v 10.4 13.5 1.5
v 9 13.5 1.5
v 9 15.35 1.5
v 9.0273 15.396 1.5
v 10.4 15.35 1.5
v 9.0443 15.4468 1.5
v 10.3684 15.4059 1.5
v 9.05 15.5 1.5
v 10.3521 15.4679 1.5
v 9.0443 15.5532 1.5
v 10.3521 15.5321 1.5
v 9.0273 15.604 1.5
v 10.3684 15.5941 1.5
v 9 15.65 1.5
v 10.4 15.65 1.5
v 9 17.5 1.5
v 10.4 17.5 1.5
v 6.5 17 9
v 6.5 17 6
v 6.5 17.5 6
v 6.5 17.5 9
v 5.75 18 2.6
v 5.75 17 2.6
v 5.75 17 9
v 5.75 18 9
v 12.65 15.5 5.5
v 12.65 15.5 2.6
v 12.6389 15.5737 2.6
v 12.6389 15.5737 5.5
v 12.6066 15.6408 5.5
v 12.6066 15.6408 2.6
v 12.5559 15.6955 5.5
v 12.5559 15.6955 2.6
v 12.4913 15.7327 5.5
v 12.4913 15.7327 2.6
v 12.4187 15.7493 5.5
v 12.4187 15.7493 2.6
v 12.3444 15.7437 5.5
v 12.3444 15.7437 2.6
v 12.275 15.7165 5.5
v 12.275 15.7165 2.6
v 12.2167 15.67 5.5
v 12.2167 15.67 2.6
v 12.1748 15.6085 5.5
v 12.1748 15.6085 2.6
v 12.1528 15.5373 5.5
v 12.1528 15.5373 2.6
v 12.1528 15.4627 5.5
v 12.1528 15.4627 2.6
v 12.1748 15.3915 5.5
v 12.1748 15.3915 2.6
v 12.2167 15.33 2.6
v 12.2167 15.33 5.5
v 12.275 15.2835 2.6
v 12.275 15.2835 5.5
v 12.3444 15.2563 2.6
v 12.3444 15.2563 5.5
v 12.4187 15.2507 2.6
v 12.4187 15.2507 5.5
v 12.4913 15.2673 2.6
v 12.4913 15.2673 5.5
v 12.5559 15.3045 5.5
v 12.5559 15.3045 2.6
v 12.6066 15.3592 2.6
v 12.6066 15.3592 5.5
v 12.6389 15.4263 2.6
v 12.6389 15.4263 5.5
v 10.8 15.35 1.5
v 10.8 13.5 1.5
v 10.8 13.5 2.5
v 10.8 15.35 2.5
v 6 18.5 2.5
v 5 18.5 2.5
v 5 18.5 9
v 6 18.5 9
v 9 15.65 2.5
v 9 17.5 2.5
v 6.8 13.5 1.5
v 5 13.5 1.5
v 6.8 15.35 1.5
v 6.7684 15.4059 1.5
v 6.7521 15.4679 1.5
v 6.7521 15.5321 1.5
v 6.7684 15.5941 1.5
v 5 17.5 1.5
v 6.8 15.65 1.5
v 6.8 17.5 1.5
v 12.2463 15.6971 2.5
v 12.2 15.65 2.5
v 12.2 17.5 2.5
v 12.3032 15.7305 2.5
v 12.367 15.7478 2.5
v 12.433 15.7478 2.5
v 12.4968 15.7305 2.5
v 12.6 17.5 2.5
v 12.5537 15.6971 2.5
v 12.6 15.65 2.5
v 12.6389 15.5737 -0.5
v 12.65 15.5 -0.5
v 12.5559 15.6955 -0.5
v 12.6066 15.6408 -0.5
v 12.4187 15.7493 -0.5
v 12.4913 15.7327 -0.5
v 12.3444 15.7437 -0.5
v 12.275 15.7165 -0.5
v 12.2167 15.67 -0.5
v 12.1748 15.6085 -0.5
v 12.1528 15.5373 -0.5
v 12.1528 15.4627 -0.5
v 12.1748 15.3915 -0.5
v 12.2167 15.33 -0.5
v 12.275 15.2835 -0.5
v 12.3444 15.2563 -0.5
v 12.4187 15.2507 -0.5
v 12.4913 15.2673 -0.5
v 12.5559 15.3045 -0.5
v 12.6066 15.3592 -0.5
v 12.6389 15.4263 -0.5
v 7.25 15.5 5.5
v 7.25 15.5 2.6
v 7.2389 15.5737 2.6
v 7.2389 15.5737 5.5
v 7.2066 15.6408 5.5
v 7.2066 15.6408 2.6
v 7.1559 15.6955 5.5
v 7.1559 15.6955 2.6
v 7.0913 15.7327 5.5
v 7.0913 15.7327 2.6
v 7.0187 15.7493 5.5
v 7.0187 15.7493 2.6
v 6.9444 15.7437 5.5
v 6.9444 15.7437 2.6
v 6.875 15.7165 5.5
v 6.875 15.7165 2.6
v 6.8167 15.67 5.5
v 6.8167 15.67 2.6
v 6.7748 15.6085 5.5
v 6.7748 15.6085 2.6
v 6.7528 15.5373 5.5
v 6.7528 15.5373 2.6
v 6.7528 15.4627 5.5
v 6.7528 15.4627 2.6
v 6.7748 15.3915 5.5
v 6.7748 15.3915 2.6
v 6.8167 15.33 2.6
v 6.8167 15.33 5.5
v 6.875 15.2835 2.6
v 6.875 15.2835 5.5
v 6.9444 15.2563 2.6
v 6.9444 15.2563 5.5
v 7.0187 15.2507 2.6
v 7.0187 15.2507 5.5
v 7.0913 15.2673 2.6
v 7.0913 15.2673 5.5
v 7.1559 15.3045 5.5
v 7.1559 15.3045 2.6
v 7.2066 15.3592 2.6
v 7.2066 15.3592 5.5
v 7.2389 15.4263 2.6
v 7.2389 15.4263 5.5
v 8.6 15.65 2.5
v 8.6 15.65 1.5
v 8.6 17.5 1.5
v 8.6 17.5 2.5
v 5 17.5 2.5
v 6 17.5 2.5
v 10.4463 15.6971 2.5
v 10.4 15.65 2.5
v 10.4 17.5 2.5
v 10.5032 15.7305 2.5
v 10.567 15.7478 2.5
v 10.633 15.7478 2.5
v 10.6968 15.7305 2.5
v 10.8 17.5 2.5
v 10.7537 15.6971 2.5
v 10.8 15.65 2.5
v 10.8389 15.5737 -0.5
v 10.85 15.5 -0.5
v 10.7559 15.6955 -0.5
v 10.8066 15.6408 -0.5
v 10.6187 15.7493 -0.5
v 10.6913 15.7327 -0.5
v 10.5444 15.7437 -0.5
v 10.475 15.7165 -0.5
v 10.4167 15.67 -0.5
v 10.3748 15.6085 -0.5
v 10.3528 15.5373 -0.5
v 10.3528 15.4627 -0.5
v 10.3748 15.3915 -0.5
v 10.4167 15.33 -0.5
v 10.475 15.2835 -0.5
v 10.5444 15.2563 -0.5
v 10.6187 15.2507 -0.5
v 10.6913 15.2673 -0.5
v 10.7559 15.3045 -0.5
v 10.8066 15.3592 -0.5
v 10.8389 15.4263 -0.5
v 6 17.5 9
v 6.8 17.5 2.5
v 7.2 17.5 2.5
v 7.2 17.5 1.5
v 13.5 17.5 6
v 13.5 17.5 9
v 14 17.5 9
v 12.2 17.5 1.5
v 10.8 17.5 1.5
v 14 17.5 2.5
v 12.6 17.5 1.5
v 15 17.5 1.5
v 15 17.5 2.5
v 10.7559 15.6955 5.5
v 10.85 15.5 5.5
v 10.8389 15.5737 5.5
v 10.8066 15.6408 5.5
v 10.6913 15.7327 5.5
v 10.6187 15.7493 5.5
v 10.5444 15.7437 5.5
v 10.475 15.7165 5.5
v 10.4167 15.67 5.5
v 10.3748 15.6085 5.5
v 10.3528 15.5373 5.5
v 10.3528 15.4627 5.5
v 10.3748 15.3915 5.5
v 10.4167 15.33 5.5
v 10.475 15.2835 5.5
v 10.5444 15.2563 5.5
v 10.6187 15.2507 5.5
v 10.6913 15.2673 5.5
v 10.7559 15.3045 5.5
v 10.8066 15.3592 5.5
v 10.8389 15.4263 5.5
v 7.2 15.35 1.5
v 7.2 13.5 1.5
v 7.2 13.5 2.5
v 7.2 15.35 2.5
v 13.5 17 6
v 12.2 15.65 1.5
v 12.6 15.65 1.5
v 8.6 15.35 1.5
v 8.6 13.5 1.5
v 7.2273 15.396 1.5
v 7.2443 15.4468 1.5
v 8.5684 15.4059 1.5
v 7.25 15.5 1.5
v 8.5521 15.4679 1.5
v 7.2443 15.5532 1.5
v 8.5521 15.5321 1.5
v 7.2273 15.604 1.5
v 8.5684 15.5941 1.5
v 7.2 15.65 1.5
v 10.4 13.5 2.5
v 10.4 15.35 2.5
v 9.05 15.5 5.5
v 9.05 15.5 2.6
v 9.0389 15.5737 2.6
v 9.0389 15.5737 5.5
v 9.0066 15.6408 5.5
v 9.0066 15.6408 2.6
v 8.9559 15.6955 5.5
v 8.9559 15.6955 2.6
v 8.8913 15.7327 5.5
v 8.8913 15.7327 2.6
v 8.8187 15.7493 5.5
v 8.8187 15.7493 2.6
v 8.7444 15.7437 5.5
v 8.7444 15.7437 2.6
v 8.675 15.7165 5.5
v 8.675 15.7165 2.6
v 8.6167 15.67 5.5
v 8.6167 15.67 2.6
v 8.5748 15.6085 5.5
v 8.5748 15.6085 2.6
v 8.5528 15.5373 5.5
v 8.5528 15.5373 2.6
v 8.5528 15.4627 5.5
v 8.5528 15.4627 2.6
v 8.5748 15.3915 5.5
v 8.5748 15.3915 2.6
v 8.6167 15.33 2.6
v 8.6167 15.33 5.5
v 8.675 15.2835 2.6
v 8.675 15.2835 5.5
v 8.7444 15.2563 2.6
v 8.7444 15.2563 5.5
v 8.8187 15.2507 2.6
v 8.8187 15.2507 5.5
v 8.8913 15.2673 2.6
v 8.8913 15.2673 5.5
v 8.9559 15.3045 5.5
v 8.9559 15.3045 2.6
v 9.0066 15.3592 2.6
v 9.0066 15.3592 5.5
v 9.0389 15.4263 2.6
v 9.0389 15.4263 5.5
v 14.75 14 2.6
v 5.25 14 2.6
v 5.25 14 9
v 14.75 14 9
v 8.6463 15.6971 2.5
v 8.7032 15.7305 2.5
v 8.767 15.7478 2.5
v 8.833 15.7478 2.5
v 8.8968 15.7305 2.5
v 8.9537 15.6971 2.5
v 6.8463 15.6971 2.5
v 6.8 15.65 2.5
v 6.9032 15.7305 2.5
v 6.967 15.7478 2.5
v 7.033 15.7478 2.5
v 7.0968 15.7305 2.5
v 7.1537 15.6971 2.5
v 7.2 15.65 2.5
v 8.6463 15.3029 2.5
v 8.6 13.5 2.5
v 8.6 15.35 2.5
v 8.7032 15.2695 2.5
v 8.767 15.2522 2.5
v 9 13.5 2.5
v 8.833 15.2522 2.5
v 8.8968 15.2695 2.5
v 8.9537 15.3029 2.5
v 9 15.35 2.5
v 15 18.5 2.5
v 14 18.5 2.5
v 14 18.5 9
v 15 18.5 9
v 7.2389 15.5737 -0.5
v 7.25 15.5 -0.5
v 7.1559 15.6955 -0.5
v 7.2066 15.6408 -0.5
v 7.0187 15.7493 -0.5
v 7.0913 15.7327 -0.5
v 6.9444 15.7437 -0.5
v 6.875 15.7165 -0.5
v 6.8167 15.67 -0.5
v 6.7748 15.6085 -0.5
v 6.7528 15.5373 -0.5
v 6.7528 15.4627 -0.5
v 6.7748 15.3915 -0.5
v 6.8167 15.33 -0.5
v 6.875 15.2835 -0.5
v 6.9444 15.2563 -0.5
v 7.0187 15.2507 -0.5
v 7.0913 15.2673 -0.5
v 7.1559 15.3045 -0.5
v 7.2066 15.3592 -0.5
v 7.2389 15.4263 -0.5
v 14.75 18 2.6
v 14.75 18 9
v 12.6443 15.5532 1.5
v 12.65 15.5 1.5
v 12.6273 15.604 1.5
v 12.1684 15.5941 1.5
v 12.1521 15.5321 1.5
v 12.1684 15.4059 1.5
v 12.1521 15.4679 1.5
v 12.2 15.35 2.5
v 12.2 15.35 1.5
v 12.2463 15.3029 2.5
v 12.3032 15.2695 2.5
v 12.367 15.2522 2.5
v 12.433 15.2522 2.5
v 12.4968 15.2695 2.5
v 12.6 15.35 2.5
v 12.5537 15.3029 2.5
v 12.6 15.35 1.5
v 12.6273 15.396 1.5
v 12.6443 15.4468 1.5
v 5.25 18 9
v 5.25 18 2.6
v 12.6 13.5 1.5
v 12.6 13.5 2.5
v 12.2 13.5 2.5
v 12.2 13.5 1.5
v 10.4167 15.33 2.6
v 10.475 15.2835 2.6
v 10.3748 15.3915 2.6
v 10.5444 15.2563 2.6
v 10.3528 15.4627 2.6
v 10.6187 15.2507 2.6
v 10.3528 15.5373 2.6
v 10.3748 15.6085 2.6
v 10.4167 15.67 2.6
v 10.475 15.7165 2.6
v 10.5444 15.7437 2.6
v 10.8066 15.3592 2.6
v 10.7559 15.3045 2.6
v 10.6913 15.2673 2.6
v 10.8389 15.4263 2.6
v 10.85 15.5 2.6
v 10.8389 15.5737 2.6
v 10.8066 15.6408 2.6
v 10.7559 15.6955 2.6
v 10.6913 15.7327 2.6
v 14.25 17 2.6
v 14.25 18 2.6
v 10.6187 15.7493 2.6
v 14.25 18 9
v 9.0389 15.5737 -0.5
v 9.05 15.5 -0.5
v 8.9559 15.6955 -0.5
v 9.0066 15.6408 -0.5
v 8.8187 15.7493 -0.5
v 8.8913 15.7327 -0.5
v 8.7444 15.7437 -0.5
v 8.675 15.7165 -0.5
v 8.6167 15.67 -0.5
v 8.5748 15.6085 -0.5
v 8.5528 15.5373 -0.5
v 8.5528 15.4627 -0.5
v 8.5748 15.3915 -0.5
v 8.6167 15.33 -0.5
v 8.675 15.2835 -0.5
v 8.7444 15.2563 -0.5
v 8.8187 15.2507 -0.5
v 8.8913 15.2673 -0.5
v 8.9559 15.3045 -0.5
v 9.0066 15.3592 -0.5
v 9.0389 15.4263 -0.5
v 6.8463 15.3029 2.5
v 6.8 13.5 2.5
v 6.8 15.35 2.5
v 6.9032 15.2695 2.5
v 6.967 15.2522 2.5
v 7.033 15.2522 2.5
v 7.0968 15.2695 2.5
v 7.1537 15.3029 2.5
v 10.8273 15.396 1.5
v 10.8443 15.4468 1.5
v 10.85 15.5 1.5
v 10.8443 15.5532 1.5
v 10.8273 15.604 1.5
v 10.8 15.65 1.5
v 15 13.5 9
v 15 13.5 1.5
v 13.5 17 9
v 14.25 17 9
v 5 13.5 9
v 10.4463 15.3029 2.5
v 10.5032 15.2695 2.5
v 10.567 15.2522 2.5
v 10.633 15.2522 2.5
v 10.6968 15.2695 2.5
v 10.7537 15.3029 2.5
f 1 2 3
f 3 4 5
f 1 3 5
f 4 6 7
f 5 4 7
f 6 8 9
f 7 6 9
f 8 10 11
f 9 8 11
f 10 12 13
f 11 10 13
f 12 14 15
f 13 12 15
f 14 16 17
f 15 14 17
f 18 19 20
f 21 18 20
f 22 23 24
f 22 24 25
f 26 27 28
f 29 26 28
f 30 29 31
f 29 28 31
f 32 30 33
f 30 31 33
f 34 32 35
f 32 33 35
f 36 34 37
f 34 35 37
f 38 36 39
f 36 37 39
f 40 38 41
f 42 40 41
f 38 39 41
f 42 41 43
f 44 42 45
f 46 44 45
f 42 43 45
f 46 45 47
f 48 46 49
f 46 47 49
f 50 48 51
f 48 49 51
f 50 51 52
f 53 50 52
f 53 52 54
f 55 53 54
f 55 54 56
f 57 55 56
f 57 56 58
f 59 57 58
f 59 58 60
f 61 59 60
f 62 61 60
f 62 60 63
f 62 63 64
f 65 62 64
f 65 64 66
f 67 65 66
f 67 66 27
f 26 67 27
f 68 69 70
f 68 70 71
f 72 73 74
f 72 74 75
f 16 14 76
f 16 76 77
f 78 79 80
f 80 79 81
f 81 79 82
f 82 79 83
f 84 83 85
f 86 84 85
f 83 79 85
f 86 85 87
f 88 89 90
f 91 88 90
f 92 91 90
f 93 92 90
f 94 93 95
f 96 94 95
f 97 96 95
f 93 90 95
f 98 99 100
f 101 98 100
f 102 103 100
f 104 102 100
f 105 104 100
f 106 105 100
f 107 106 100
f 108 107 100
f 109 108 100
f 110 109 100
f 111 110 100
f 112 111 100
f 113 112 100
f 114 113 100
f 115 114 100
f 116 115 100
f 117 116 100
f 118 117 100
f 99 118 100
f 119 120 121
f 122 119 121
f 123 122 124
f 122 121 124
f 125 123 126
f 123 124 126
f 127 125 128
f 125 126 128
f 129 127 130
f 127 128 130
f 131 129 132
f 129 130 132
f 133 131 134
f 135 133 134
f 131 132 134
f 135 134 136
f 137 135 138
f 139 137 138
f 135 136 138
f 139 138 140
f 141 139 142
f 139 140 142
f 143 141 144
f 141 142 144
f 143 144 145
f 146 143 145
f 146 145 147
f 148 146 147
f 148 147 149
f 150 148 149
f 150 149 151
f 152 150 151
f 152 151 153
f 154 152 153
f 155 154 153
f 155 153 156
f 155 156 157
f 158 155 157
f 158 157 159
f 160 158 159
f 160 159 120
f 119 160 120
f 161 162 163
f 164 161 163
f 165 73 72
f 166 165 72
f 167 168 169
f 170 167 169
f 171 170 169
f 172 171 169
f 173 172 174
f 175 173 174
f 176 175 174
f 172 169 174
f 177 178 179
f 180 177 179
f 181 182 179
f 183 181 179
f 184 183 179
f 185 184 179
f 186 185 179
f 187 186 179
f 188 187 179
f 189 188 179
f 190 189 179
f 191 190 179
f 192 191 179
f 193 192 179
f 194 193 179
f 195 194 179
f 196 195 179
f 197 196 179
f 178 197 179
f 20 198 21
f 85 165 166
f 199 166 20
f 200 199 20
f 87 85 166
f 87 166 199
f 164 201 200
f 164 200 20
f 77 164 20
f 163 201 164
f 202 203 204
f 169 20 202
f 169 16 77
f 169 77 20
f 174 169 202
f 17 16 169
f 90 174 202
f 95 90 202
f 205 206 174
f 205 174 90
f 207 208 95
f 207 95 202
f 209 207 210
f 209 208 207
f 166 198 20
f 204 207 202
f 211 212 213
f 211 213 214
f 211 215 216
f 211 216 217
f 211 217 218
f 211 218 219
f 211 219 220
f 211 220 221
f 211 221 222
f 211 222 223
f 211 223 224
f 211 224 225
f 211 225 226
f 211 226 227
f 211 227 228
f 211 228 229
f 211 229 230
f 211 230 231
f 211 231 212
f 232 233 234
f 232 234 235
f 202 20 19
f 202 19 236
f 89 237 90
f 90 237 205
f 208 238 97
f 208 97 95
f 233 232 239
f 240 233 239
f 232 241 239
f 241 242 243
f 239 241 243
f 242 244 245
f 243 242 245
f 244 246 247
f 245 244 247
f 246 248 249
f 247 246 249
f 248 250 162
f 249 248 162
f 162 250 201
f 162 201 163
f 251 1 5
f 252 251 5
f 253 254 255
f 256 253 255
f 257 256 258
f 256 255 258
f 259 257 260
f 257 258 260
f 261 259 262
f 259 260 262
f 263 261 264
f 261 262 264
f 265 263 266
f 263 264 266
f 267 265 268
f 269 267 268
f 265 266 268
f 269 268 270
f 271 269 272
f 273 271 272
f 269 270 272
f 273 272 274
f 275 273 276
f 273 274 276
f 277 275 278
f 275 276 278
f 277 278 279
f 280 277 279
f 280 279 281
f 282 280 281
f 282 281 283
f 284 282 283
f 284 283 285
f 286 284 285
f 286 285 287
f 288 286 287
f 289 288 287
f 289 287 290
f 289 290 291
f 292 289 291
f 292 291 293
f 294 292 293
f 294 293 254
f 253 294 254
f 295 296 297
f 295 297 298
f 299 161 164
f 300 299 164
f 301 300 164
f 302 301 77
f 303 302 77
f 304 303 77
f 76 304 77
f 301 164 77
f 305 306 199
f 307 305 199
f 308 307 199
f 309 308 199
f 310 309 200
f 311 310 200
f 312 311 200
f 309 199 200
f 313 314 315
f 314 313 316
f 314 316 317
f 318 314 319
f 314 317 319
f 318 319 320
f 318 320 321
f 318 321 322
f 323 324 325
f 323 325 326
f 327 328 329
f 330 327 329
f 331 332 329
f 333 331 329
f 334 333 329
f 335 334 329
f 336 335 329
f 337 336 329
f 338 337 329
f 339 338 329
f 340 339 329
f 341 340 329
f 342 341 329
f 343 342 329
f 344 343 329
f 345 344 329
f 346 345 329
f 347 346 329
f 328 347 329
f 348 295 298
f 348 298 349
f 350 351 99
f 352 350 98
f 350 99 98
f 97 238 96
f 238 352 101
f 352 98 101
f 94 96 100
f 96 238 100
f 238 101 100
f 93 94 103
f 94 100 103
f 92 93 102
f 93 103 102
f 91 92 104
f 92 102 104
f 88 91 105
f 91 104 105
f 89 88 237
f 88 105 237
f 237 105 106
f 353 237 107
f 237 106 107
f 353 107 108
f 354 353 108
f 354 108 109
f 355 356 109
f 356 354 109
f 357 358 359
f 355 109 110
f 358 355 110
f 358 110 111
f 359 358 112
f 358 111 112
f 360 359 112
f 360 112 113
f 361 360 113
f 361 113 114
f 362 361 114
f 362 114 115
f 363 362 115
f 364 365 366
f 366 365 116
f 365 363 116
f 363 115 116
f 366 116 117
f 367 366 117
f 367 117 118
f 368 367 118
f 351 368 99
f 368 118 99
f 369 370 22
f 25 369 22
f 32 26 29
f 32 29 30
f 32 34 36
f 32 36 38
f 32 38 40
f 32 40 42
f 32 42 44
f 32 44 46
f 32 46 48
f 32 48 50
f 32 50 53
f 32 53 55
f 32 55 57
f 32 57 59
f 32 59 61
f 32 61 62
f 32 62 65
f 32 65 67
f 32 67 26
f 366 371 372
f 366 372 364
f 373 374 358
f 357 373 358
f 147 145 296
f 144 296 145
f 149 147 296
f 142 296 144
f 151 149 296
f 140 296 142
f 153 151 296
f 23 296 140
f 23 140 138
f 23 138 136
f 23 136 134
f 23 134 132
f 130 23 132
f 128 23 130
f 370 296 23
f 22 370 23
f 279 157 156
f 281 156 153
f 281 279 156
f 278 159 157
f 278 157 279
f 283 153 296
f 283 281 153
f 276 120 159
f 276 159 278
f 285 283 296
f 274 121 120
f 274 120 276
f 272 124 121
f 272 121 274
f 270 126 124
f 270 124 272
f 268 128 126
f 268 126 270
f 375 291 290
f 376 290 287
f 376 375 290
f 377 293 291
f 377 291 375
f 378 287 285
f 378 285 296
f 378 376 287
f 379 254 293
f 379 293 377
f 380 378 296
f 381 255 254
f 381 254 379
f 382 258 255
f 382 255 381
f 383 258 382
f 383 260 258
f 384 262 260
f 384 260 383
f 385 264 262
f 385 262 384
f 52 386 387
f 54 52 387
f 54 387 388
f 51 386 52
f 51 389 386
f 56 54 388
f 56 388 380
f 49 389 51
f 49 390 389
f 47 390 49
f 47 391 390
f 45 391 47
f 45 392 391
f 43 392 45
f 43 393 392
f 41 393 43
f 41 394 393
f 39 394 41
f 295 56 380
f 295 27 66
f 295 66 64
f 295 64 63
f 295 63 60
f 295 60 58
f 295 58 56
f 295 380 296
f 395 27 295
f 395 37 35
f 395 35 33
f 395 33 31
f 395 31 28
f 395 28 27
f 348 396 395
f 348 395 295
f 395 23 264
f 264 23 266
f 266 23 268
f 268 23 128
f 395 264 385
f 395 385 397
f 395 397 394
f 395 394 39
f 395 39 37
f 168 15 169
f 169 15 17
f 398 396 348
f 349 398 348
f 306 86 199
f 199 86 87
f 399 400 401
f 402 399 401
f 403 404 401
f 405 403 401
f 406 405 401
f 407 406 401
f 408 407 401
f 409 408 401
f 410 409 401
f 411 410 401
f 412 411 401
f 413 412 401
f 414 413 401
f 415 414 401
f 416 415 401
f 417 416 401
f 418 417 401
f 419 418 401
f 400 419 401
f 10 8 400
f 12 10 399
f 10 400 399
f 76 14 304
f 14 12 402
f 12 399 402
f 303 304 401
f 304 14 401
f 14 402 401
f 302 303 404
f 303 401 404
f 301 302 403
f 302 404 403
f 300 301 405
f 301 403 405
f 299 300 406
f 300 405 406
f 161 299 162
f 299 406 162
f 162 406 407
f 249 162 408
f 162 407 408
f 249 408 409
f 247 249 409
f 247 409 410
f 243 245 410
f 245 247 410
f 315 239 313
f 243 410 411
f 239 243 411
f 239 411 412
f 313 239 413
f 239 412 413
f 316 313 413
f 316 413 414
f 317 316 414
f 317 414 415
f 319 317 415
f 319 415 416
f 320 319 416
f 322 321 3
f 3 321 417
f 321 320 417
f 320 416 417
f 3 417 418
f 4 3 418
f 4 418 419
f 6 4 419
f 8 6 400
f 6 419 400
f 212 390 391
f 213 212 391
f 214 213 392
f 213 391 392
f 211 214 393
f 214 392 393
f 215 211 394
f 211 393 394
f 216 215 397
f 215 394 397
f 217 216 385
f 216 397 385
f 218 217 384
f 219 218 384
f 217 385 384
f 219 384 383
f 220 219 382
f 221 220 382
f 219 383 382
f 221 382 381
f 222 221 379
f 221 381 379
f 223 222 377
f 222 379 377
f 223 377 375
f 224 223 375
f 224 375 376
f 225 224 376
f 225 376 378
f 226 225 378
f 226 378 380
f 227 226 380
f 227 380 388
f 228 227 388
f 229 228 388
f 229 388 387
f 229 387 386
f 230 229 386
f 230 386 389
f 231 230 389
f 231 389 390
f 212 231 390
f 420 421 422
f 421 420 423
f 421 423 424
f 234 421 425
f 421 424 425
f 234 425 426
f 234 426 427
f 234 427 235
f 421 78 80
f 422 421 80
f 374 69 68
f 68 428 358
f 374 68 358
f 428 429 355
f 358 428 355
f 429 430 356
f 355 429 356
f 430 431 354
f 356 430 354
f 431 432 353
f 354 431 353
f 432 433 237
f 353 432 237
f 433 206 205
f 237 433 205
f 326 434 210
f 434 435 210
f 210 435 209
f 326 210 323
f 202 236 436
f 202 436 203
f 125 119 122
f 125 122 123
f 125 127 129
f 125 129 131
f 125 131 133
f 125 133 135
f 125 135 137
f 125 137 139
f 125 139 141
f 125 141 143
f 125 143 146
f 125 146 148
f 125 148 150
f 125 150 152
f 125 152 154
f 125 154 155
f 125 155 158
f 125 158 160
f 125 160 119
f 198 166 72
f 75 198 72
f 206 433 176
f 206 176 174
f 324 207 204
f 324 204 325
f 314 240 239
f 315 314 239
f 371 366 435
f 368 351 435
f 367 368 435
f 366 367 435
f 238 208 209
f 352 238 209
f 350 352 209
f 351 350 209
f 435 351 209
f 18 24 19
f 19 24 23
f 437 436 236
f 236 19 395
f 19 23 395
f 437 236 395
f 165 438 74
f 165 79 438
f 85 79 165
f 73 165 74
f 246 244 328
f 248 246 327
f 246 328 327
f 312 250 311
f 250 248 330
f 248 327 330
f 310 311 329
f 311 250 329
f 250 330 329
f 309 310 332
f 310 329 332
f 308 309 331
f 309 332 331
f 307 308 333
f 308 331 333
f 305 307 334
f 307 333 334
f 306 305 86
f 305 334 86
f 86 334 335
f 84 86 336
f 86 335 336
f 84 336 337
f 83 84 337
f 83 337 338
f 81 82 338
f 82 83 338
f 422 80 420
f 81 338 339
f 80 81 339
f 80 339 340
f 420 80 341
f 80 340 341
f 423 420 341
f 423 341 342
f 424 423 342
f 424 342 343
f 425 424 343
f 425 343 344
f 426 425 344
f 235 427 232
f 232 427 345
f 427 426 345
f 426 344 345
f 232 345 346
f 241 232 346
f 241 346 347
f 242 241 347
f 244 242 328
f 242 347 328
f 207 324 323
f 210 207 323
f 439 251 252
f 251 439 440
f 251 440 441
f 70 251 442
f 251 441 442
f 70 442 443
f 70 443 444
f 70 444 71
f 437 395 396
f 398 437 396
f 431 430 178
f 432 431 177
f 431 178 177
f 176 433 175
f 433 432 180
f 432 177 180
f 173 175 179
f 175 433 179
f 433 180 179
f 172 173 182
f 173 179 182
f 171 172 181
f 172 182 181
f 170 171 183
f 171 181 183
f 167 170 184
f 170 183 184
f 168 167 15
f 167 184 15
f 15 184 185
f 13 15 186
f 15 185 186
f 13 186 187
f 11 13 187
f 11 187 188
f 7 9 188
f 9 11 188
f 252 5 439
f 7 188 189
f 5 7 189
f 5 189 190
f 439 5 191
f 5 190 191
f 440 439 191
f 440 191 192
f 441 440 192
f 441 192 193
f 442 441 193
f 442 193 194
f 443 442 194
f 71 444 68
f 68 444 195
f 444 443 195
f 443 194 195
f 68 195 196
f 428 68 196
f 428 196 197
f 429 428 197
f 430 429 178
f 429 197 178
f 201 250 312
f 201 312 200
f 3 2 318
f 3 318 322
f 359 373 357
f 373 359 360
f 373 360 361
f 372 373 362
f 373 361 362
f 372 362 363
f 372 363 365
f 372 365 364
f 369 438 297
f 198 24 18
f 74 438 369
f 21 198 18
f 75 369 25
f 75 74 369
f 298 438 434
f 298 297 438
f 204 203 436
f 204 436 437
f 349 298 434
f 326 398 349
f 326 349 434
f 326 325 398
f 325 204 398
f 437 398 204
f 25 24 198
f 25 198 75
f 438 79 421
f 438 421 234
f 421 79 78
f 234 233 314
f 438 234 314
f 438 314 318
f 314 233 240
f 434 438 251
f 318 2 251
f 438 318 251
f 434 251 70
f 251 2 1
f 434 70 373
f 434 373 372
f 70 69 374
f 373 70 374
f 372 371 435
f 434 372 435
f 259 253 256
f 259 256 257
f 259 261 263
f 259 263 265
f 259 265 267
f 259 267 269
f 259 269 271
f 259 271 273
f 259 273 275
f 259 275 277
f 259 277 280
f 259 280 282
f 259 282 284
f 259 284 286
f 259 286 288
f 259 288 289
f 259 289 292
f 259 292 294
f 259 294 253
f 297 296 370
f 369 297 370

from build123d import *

# Parameters (mm, degrees)
CYLINDER_R     = 0.25
CYLINDER_DEPTH = 6
ARRAY_X_COUNT  = 4
ARRAY_X_PITCH  = 1.8
BOX011_W       = 7
BOX011_H       = 7
BOX011_DEPTH   = 3
BOX010_W       = 0.5
BOX010_H       = 4
BOX010_DEPTH   = 10
BOX009_W       = 0.5
BOX009_H       = 4
BOX009_DEPTH   = 10
BOX008_W       = 8
BOX008_H       = 3
BOX008_DEPTH   = 10
BOX007_W       = 9
BOX007_H       = 3
BOX007_DEPTH   = 10
BOX006_W       = 0.4
BOX006_H       = 10
BOX006_DEPTH   = 1
BOX005_W       = 0.4
BOX005_H       = 10
BOX005_DEPTH   = 1
BOX004_W       = 0.4
BOX004_H       = 10
BOX004_DEPTH   = 1
BOX003_W       = 0.4
BOX003_H       = 10
BOX003_DEPTH   = 1
BOX002_W       = 10
BOX002_H       = 5
BOX002_DEPTH   = 6.5
BOX001_W       = 10
BOX001_H       = 4
BOX001_DEPTH   = 1


with BuildPart() as array:
    # Cylinder → Cylinder (new body)
    with BuildSketch(Plane(origin=(2, 2, -2), x_dir=(1, 0, 0), z_dir=(0, 0, 1))):
        Circle(CYLINDER_R)
    extrude(amount=CYLINDER_DEPTH)

    # Array X: Array ×4


with BuildPart() as array_1:
    add(array.part)
    with Locations(*[(i * ARRAY_X_PITCH, 0, 0) for i in range(1, ARRAY_X_COUNT)]):
        add(array.part)


with BuildPart() as cubo011:
    # Box011 → Box011 (new body)
    with BuildSketch(Plane(origin=(1.5, 3, 4.5), x_dir=(1, 0, 0), z_dir=(0, 0, 1))):
        with Locations((3.5, 3.5)):
            Rectangle(BOX011_W, BOX011_H)
    extrude(amount=BOX011_DEPTH)


with BuildPart() as cubo010:
    # Box010 → Box010 (new body)
    with BuildSketch(Plane(origin=(9.25, 0.5, 1.1), x_dir=(1, 0, 0), z_dir=(0, 0, 1))):
        with Locations((0.25, 2)):
            Rectangle(BOX010_W, BOX010_H)
    extrude(amount=BOX010_DEPTH)


with BuildPart() as cubo009:
    # Box009 → Box009 (new body)
    with BuildSketch(Plane(origin=(0.25, 0.5, 1.1), x_dir=(1, 0, 0), z_dir=(0, 0, 1))):
        with Locations((0.25, 2)):
            Rectangle(BOX009_W, BOX009_H)
    extrude(amount=BOX009_DEPTH)


with BuildPart() as cubo008:
    # Box008 → Box008 (new body)
    with BuildSketch(Plane(origin=(1, 4, 0), x_dir=(1, 0, 0), z_dir=(0, 0, 1))):
        with Locations((4, 1.5)):
            Rectangle(BOX008_W, BOX008_H)
    extrude(amount=BOX008_DEPTH)


with BuildPart() as cubo007:
    # Box007 → Box007 (new body)
    with BuildSketch(Plane(origin=(0.5, 0.5, 1.1), x_dir=(1, 0, 0), z_dir=(0, 0, 1))):
        with Locations((4.5, 1.5)):
            Rectangle(BOX007_W, BOX007_H)
    extrude(amount=BOX007_DEPTH)


with BuildPart() as cubo006:
    # Box006 → Box006 (new body)
    with BuildSketch(Plane(origin=(7.2, -3, 0), x_dir=(1, 0, 0), z_dir=(0, 0, 1))):
        with Locations((0.2, 5)):
            Rectangle(BOX006_W, BOX006_H)
    extrude(amount=BOX006_DEPTH)


with BuildPart() as cubo005:
    # Box005 → Box005 (new body)
    with BuildSketch(Plane(origin=(5.4, -3, 0), x_dir=(1, 0, 0), z_dir=(0, 0, 1))):
        with Locations((0.2, 5)):
            Rectangle(BOX005_W, BOX005_H)
    extrude(amount=BOX005_DEPTH)


with BuildPart() as cubo004:
    # Box004 → Box004 (new body)
    with BuildSketch(Plane(origin=(3.6, -3, 0), x_dir=(1, 0, 0), z_dir=(0, 0, 1))):
        with Locations((0.2, 5)):
            Rectangle(BOX004_W, BOX004_H)
    extrude(amount=BOX004_DEPTH)


with BuildPart() as cubo003:
    # Box003 → Box003 (new body)
    with BuildSketch(Plane(origin=(1.8, -3, 0), x_dir=(1, 0, 0), z_dir=(0, 0, 1))):
        with Locations((0.2, 5)):
            Rectangle(BOX003_W, BOX003_H)
    extrude(amount=BOX003_DEPTH)


with BuildPart() as cubo002:
    # Box002 → Box002 (new body)
    with BuildSketch(Plane.XY.offset(1)):
        with Locations((5, 2.5)):
            Rectangle(BOX002_W, BOX002_H)
    extrude(amount=BOX002_DEPTH)


with BuildPart() as conector:
    # Box001 → Box001 (new body)
    with BuildSketch(Plane.XY):
        with Locations((5, 2)):
            Rectangle(BOX001_W, BOX001_H)
    extrude(amount=BOX001_DEPTH)

    # Fusion: union Cubo002
    add(cubo002.part)

    # Cut: cut Cubo003
    add(cubo003.part, mode=Mode.SUBTRACT)

    # Cut001: cut Cubo004
    add(cubo004.part, mode=Mode.SUBTRACT)

    # Cut002: cut Cubo005
    add(cubo005.part, mode=Mode.SUBTRACT)

    # Cut003: cut Cubo006
    add(cubo006.part, mode=Mode.SUBTRACT)

    # Cut004: cut Cubo007
    add(cubo007.part, mode=Mode.SUBTRACT)

    # Cut005: cut Cubo008
    add(cubo008.part, mode=Mode.SUBTRACT)

    # Cut006: cut Cubo009
    add(cubo009.part, mode=Mode.SUBTRACT)

    # Cut007: cut Cubo010
    add(cubo010.part, mode=Mode.SUBTRACT)

    # Cut008: cut Cubo011
    add(cubo011.part, mode=Mode.SUBTRACT)

    # Fusion001: union Array
    add(array_1.part)


with BuildPart() as conector_1:
    # Fusion001 placement: moved
    add(conector.part.moved(Location((5, 13.5, 1.5))))


solid = conector_1.part
